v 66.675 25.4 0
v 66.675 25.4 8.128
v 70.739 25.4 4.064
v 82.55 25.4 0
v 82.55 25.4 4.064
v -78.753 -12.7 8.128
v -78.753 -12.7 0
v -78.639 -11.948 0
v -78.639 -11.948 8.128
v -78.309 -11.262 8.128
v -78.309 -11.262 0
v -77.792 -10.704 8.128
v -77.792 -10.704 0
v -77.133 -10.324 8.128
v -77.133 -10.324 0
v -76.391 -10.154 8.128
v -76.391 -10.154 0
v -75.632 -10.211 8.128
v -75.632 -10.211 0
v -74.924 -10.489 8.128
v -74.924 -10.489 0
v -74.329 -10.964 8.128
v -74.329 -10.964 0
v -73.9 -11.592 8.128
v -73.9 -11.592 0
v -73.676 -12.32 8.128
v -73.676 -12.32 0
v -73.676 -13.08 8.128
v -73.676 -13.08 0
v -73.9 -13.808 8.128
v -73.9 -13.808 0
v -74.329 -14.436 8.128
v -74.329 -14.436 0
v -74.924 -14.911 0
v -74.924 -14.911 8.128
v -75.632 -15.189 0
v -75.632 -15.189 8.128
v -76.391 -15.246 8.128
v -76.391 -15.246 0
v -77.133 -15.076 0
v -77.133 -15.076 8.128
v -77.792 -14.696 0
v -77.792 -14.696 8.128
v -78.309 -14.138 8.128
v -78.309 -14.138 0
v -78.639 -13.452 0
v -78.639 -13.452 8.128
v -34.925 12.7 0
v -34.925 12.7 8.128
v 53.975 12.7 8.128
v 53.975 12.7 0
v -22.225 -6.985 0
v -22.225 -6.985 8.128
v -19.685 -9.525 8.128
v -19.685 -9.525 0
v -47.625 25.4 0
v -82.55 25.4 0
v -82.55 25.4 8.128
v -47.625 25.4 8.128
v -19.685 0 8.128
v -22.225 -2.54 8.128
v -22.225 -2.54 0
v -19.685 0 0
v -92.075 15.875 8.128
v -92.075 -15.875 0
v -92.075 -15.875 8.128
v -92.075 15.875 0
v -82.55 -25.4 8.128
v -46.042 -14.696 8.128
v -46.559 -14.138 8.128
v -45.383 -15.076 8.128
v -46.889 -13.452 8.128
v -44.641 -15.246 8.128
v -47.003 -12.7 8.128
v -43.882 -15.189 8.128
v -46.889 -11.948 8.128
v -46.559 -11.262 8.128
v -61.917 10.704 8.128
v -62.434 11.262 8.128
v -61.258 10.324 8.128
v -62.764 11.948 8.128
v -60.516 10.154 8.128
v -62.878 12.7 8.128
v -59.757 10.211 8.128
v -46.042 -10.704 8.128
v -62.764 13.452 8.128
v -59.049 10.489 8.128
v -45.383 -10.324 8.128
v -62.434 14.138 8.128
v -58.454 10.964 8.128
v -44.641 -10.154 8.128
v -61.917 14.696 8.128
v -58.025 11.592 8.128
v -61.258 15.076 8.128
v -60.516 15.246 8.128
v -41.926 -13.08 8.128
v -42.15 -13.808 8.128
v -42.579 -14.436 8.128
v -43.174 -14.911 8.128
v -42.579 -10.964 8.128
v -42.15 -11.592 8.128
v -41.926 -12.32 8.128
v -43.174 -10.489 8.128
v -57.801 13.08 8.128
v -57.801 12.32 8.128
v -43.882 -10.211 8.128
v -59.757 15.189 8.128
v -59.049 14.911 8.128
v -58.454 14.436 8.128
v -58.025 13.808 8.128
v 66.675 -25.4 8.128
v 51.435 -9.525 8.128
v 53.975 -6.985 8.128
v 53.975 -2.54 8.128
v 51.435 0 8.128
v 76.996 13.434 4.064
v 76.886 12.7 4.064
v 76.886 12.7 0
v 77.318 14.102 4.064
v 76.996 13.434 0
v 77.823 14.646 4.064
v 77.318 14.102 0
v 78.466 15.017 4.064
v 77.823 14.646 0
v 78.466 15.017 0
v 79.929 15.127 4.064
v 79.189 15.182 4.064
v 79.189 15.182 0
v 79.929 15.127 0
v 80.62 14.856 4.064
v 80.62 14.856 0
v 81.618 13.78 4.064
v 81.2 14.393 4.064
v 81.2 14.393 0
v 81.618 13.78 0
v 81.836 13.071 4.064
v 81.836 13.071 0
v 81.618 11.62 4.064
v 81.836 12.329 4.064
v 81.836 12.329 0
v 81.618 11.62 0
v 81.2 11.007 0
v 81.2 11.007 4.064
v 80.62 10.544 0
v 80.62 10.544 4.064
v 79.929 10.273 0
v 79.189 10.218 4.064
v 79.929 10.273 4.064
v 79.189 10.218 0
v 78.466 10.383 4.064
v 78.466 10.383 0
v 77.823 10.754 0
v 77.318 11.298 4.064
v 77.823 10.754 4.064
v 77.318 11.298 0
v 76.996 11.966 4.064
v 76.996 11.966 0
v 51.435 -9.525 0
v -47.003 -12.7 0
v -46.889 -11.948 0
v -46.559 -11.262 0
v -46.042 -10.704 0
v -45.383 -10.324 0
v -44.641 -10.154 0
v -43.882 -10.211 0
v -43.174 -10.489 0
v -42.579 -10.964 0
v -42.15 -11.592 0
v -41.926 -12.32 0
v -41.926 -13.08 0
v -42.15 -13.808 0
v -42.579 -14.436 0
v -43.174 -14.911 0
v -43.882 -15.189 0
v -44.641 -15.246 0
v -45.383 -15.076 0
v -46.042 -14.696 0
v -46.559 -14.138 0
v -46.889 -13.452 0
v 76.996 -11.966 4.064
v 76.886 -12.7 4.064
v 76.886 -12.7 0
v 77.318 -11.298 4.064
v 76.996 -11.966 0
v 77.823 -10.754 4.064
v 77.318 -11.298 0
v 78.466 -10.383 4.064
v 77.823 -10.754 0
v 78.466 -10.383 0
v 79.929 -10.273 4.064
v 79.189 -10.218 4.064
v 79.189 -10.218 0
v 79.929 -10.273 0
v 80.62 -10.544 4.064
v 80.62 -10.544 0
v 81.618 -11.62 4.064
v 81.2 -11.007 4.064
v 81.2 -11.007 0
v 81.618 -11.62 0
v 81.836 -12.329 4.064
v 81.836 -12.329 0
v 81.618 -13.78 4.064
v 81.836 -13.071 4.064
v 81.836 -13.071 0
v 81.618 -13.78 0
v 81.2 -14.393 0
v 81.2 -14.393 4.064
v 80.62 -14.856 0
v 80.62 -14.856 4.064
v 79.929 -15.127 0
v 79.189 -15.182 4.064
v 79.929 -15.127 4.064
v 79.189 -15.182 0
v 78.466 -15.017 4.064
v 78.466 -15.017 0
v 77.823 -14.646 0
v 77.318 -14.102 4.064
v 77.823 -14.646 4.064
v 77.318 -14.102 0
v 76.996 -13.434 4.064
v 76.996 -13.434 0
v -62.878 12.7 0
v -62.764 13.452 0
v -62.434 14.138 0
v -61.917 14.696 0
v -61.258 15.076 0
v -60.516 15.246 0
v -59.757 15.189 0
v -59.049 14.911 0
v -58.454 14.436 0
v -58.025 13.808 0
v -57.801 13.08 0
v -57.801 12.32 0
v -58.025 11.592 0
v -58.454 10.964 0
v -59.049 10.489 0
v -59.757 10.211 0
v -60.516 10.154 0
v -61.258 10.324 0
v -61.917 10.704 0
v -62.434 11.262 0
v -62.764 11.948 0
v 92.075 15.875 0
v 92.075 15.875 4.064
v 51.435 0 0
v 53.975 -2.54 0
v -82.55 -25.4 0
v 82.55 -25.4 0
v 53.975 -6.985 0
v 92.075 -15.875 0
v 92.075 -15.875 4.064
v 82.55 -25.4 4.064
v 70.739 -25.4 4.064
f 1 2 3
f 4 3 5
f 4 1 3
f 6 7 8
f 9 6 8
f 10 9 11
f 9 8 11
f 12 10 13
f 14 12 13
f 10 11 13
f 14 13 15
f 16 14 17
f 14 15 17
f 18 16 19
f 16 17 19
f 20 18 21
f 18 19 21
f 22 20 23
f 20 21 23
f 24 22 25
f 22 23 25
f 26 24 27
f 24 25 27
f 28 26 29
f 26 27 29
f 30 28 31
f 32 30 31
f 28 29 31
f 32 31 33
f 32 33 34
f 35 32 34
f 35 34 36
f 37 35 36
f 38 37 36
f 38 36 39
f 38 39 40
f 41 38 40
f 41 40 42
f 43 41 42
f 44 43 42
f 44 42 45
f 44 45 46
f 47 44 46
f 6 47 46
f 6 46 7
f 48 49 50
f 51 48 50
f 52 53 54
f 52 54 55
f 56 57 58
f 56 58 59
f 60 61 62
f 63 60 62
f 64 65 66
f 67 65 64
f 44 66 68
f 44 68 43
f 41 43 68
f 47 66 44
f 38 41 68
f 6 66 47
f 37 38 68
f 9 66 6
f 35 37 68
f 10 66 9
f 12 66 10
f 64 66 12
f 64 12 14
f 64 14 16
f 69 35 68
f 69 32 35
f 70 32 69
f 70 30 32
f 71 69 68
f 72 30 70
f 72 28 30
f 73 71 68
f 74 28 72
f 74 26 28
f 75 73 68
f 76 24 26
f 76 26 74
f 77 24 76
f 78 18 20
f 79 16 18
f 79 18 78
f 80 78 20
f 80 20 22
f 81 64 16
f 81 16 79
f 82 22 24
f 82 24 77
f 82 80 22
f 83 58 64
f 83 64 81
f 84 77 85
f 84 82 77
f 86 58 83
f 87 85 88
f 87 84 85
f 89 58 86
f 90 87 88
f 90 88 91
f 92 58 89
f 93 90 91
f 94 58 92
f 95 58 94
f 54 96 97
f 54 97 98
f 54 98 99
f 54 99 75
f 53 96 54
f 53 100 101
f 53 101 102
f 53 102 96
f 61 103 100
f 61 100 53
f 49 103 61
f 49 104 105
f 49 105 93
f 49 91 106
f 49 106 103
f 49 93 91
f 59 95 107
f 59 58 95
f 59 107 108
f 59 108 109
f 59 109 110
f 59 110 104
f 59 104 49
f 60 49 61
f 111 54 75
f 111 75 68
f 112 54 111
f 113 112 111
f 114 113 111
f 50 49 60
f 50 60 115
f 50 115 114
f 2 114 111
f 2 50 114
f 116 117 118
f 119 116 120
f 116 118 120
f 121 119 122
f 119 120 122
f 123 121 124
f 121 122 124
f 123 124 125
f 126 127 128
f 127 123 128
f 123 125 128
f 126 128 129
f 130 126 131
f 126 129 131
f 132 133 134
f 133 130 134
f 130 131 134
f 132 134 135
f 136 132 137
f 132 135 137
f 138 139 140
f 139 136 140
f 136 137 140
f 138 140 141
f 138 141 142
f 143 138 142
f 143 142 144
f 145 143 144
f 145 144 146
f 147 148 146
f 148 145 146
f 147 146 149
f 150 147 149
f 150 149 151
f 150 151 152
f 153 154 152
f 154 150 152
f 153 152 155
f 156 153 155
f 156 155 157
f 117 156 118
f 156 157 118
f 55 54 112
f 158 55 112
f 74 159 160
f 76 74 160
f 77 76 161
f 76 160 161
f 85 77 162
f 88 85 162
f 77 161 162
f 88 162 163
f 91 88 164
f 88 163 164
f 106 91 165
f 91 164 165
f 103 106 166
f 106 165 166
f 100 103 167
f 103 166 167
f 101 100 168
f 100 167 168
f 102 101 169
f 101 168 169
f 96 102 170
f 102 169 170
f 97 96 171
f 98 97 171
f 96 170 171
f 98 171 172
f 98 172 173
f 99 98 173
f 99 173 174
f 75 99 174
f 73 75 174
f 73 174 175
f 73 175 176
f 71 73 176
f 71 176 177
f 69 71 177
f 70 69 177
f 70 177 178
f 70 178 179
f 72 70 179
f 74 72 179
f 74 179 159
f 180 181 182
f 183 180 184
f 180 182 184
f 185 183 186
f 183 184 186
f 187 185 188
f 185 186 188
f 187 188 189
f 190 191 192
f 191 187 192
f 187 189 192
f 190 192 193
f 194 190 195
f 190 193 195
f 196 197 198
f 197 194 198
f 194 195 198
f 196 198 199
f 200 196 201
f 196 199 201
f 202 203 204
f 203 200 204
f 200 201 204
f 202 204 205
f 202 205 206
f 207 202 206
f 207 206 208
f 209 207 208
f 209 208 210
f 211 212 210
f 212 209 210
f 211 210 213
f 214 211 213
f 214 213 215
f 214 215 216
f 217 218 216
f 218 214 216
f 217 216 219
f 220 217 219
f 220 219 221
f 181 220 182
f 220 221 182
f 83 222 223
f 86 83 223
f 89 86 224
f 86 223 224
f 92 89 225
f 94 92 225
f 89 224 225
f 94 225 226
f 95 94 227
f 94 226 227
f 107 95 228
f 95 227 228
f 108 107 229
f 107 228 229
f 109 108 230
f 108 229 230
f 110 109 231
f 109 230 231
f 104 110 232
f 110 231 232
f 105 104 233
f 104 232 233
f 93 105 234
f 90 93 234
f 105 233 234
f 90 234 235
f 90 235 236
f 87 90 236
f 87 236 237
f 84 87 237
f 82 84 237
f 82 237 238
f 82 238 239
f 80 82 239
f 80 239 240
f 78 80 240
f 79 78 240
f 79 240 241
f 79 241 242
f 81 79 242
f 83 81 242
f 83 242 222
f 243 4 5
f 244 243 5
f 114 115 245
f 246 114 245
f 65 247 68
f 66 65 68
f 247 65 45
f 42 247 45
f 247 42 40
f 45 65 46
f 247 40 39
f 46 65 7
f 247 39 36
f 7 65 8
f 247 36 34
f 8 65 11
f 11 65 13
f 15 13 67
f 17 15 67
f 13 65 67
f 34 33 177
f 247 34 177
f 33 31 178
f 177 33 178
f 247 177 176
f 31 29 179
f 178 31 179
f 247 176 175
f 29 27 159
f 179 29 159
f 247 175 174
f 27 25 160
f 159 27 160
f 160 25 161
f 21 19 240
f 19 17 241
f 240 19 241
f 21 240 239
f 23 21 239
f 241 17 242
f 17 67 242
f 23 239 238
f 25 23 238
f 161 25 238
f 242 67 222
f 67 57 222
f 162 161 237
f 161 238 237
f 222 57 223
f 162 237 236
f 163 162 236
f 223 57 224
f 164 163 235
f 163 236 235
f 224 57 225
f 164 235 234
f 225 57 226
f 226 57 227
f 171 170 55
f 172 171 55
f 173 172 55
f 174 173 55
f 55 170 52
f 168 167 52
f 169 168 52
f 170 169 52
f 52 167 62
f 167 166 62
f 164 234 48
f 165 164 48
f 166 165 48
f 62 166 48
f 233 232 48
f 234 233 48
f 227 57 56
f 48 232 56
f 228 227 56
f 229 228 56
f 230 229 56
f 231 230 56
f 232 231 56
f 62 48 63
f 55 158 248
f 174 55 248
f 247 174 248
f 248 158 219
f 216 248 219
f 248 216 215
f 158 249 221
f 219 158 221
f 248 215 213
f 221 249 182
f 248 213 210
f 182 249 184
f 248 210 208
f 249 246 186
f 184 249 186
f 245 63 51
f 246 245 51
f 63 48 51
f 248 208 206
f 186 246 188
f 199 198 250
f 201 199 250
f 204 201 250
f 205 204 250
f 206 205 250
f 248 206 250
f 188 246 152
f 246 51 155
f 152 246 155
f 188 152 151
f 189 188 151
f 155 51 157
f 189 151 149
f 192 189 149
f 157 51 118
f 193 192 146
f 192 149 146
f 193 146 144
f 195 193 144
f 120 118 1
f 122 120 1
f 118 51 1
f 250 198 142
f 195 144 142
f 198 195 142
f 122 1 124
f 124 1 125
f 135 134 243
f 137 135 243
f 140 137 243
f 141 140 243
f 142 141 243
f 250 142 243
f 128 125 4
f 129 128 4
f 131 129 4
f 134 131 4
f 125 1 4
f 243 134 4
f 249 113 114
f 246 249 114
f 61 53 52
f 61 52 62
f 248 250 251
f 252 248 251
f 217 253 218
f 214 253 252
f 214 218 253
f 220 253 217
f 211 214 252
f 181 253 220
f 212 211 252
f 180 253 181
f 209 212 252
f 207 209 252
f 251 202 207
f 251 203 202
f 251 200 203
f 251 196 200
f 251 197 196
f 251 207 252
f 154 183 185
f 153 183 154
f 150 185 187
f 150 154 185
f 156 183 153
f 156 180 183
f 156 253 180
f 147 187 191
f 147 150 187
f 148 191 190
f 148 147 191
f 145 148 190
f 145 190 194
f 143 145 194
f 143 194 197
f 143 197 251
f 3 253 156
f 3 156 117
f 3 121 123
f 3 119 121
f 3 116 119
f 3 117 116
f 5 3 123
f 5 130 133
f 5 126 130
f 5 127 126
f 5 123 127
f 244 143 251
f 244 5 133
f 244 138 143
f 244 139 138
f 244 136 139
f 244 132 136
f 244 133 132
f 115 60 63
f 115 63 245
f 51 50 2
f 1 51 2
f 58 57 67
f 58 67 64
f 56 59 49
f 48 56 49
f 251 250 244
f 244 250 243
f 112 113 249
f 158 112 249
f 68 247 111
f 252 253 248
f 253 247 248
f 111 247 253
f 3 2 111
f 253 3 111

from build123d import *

# Parameters (mm, degrees)
F0_W      = 184.15
F0_H      = 50.8
F1_DEPTH  = 8.128
F3_D      = 5.1054
F6_D      = 4.9784
F7_W      = 76.2
F7_H      = 9.525
F8_DEPTH  = 8.129
F9_SIZE   = 9.525
F10_SIZE  = 2.54
F11_R     = 2.4892
F12_DEPTH = 4.064
F13_SIZE  = 4.06399


# Not quite as in the source:
# - a fillet or chamfer is up to 0.001 mm smaller than in the source, because OpenCascade refuses the exact size


with BuildPart() as f1:
    # F0 (on Top) → F1 (new body)
    with BuildSketch(Plane.XY):
        Rectangle(F0_W, F0_H)
    extrude(amount=F1_DEPTH)

    # F3 (through all)
    with Locations(Plane.XY.offset(8.128)):
        with Locations((-60.325, 12.7), (-76.2, -12.7), (-44.45, -12.7)):
            Hole(F3_D / 2)

    # F6 (through all)
    with Locations(Plane.XY.offset(8.128)):
        with Locations((79.375, 12.7), (79.375, -12.7)):
            Hole(F6_D / 2)

    # F7 (on face) → F8 (cut, through all)
    with BuildSketch(Plane.XY.offset(8.128)):
        Polygon((66.675, 25.4), (-47.625, 25.4), (-34.925, 12.7), (53.975, 12.7), align=None)
        with Locations((15.875, -4.7625)):
            Rectangle(F7_W, F7_H)
    extrude(amount=-F8_DEPTH, mode=Mode.SUBTRACT)

    # F9
    f9_edges = [f1.edges().sort_by_distance(p)[0] for p in [
        (-92.075, -25.4, 4.064),
        (-92.075, 25.4, 4.064),
        (92.075, -25.4, 4.064),
        (92.075, 25.4, 4.064),
    ]]
    chamfer(f9_edges, length=F9_SIZE)

    # F10
    f10_edges = [f1.edges().sort_by_distance(p)[0] for p in [
        (-22.225, 0, 4.064),
        (-22.225, -9.525, 4.064),
        (53.975, 0, 4.064),
        (53.975, -9.525, 4.064),
    ]]
    chamfer(f10_edges, length=F10_SIZE)

    # F11 (on face) → F12 (cut)
    with BuildSketch(Plane.XY.offset(8.128)):
        Polygon((82.55, 25.4), (66.675, 25.4), (66.675, -25.4), (82.55, -25.4), (92.075, -15.875), (92.075, 15.875), align=None)
        with Locations((79.375, -12.7)):
            Circle(F11_R, mode=Mode.SUBTRACT)
        with Locations((79.375, 12.7)):
            Circle(F11_R, mode=Mode.SUBTRACT)
    extrude(amount=-F12_DEPTH, mode=Mode.SUBTRACT)

    # F13 (size 4.064 in the source; OpenCascade refuses exactly that, so slightly less here)
    f13_edges = [f1.edges().sort_by_distance(p)[0] for p in [
        (66.675, 0, 4.064),
    ]]
    chamfer(f13_edges, length=F13_SIZE)


solid = f1.part
